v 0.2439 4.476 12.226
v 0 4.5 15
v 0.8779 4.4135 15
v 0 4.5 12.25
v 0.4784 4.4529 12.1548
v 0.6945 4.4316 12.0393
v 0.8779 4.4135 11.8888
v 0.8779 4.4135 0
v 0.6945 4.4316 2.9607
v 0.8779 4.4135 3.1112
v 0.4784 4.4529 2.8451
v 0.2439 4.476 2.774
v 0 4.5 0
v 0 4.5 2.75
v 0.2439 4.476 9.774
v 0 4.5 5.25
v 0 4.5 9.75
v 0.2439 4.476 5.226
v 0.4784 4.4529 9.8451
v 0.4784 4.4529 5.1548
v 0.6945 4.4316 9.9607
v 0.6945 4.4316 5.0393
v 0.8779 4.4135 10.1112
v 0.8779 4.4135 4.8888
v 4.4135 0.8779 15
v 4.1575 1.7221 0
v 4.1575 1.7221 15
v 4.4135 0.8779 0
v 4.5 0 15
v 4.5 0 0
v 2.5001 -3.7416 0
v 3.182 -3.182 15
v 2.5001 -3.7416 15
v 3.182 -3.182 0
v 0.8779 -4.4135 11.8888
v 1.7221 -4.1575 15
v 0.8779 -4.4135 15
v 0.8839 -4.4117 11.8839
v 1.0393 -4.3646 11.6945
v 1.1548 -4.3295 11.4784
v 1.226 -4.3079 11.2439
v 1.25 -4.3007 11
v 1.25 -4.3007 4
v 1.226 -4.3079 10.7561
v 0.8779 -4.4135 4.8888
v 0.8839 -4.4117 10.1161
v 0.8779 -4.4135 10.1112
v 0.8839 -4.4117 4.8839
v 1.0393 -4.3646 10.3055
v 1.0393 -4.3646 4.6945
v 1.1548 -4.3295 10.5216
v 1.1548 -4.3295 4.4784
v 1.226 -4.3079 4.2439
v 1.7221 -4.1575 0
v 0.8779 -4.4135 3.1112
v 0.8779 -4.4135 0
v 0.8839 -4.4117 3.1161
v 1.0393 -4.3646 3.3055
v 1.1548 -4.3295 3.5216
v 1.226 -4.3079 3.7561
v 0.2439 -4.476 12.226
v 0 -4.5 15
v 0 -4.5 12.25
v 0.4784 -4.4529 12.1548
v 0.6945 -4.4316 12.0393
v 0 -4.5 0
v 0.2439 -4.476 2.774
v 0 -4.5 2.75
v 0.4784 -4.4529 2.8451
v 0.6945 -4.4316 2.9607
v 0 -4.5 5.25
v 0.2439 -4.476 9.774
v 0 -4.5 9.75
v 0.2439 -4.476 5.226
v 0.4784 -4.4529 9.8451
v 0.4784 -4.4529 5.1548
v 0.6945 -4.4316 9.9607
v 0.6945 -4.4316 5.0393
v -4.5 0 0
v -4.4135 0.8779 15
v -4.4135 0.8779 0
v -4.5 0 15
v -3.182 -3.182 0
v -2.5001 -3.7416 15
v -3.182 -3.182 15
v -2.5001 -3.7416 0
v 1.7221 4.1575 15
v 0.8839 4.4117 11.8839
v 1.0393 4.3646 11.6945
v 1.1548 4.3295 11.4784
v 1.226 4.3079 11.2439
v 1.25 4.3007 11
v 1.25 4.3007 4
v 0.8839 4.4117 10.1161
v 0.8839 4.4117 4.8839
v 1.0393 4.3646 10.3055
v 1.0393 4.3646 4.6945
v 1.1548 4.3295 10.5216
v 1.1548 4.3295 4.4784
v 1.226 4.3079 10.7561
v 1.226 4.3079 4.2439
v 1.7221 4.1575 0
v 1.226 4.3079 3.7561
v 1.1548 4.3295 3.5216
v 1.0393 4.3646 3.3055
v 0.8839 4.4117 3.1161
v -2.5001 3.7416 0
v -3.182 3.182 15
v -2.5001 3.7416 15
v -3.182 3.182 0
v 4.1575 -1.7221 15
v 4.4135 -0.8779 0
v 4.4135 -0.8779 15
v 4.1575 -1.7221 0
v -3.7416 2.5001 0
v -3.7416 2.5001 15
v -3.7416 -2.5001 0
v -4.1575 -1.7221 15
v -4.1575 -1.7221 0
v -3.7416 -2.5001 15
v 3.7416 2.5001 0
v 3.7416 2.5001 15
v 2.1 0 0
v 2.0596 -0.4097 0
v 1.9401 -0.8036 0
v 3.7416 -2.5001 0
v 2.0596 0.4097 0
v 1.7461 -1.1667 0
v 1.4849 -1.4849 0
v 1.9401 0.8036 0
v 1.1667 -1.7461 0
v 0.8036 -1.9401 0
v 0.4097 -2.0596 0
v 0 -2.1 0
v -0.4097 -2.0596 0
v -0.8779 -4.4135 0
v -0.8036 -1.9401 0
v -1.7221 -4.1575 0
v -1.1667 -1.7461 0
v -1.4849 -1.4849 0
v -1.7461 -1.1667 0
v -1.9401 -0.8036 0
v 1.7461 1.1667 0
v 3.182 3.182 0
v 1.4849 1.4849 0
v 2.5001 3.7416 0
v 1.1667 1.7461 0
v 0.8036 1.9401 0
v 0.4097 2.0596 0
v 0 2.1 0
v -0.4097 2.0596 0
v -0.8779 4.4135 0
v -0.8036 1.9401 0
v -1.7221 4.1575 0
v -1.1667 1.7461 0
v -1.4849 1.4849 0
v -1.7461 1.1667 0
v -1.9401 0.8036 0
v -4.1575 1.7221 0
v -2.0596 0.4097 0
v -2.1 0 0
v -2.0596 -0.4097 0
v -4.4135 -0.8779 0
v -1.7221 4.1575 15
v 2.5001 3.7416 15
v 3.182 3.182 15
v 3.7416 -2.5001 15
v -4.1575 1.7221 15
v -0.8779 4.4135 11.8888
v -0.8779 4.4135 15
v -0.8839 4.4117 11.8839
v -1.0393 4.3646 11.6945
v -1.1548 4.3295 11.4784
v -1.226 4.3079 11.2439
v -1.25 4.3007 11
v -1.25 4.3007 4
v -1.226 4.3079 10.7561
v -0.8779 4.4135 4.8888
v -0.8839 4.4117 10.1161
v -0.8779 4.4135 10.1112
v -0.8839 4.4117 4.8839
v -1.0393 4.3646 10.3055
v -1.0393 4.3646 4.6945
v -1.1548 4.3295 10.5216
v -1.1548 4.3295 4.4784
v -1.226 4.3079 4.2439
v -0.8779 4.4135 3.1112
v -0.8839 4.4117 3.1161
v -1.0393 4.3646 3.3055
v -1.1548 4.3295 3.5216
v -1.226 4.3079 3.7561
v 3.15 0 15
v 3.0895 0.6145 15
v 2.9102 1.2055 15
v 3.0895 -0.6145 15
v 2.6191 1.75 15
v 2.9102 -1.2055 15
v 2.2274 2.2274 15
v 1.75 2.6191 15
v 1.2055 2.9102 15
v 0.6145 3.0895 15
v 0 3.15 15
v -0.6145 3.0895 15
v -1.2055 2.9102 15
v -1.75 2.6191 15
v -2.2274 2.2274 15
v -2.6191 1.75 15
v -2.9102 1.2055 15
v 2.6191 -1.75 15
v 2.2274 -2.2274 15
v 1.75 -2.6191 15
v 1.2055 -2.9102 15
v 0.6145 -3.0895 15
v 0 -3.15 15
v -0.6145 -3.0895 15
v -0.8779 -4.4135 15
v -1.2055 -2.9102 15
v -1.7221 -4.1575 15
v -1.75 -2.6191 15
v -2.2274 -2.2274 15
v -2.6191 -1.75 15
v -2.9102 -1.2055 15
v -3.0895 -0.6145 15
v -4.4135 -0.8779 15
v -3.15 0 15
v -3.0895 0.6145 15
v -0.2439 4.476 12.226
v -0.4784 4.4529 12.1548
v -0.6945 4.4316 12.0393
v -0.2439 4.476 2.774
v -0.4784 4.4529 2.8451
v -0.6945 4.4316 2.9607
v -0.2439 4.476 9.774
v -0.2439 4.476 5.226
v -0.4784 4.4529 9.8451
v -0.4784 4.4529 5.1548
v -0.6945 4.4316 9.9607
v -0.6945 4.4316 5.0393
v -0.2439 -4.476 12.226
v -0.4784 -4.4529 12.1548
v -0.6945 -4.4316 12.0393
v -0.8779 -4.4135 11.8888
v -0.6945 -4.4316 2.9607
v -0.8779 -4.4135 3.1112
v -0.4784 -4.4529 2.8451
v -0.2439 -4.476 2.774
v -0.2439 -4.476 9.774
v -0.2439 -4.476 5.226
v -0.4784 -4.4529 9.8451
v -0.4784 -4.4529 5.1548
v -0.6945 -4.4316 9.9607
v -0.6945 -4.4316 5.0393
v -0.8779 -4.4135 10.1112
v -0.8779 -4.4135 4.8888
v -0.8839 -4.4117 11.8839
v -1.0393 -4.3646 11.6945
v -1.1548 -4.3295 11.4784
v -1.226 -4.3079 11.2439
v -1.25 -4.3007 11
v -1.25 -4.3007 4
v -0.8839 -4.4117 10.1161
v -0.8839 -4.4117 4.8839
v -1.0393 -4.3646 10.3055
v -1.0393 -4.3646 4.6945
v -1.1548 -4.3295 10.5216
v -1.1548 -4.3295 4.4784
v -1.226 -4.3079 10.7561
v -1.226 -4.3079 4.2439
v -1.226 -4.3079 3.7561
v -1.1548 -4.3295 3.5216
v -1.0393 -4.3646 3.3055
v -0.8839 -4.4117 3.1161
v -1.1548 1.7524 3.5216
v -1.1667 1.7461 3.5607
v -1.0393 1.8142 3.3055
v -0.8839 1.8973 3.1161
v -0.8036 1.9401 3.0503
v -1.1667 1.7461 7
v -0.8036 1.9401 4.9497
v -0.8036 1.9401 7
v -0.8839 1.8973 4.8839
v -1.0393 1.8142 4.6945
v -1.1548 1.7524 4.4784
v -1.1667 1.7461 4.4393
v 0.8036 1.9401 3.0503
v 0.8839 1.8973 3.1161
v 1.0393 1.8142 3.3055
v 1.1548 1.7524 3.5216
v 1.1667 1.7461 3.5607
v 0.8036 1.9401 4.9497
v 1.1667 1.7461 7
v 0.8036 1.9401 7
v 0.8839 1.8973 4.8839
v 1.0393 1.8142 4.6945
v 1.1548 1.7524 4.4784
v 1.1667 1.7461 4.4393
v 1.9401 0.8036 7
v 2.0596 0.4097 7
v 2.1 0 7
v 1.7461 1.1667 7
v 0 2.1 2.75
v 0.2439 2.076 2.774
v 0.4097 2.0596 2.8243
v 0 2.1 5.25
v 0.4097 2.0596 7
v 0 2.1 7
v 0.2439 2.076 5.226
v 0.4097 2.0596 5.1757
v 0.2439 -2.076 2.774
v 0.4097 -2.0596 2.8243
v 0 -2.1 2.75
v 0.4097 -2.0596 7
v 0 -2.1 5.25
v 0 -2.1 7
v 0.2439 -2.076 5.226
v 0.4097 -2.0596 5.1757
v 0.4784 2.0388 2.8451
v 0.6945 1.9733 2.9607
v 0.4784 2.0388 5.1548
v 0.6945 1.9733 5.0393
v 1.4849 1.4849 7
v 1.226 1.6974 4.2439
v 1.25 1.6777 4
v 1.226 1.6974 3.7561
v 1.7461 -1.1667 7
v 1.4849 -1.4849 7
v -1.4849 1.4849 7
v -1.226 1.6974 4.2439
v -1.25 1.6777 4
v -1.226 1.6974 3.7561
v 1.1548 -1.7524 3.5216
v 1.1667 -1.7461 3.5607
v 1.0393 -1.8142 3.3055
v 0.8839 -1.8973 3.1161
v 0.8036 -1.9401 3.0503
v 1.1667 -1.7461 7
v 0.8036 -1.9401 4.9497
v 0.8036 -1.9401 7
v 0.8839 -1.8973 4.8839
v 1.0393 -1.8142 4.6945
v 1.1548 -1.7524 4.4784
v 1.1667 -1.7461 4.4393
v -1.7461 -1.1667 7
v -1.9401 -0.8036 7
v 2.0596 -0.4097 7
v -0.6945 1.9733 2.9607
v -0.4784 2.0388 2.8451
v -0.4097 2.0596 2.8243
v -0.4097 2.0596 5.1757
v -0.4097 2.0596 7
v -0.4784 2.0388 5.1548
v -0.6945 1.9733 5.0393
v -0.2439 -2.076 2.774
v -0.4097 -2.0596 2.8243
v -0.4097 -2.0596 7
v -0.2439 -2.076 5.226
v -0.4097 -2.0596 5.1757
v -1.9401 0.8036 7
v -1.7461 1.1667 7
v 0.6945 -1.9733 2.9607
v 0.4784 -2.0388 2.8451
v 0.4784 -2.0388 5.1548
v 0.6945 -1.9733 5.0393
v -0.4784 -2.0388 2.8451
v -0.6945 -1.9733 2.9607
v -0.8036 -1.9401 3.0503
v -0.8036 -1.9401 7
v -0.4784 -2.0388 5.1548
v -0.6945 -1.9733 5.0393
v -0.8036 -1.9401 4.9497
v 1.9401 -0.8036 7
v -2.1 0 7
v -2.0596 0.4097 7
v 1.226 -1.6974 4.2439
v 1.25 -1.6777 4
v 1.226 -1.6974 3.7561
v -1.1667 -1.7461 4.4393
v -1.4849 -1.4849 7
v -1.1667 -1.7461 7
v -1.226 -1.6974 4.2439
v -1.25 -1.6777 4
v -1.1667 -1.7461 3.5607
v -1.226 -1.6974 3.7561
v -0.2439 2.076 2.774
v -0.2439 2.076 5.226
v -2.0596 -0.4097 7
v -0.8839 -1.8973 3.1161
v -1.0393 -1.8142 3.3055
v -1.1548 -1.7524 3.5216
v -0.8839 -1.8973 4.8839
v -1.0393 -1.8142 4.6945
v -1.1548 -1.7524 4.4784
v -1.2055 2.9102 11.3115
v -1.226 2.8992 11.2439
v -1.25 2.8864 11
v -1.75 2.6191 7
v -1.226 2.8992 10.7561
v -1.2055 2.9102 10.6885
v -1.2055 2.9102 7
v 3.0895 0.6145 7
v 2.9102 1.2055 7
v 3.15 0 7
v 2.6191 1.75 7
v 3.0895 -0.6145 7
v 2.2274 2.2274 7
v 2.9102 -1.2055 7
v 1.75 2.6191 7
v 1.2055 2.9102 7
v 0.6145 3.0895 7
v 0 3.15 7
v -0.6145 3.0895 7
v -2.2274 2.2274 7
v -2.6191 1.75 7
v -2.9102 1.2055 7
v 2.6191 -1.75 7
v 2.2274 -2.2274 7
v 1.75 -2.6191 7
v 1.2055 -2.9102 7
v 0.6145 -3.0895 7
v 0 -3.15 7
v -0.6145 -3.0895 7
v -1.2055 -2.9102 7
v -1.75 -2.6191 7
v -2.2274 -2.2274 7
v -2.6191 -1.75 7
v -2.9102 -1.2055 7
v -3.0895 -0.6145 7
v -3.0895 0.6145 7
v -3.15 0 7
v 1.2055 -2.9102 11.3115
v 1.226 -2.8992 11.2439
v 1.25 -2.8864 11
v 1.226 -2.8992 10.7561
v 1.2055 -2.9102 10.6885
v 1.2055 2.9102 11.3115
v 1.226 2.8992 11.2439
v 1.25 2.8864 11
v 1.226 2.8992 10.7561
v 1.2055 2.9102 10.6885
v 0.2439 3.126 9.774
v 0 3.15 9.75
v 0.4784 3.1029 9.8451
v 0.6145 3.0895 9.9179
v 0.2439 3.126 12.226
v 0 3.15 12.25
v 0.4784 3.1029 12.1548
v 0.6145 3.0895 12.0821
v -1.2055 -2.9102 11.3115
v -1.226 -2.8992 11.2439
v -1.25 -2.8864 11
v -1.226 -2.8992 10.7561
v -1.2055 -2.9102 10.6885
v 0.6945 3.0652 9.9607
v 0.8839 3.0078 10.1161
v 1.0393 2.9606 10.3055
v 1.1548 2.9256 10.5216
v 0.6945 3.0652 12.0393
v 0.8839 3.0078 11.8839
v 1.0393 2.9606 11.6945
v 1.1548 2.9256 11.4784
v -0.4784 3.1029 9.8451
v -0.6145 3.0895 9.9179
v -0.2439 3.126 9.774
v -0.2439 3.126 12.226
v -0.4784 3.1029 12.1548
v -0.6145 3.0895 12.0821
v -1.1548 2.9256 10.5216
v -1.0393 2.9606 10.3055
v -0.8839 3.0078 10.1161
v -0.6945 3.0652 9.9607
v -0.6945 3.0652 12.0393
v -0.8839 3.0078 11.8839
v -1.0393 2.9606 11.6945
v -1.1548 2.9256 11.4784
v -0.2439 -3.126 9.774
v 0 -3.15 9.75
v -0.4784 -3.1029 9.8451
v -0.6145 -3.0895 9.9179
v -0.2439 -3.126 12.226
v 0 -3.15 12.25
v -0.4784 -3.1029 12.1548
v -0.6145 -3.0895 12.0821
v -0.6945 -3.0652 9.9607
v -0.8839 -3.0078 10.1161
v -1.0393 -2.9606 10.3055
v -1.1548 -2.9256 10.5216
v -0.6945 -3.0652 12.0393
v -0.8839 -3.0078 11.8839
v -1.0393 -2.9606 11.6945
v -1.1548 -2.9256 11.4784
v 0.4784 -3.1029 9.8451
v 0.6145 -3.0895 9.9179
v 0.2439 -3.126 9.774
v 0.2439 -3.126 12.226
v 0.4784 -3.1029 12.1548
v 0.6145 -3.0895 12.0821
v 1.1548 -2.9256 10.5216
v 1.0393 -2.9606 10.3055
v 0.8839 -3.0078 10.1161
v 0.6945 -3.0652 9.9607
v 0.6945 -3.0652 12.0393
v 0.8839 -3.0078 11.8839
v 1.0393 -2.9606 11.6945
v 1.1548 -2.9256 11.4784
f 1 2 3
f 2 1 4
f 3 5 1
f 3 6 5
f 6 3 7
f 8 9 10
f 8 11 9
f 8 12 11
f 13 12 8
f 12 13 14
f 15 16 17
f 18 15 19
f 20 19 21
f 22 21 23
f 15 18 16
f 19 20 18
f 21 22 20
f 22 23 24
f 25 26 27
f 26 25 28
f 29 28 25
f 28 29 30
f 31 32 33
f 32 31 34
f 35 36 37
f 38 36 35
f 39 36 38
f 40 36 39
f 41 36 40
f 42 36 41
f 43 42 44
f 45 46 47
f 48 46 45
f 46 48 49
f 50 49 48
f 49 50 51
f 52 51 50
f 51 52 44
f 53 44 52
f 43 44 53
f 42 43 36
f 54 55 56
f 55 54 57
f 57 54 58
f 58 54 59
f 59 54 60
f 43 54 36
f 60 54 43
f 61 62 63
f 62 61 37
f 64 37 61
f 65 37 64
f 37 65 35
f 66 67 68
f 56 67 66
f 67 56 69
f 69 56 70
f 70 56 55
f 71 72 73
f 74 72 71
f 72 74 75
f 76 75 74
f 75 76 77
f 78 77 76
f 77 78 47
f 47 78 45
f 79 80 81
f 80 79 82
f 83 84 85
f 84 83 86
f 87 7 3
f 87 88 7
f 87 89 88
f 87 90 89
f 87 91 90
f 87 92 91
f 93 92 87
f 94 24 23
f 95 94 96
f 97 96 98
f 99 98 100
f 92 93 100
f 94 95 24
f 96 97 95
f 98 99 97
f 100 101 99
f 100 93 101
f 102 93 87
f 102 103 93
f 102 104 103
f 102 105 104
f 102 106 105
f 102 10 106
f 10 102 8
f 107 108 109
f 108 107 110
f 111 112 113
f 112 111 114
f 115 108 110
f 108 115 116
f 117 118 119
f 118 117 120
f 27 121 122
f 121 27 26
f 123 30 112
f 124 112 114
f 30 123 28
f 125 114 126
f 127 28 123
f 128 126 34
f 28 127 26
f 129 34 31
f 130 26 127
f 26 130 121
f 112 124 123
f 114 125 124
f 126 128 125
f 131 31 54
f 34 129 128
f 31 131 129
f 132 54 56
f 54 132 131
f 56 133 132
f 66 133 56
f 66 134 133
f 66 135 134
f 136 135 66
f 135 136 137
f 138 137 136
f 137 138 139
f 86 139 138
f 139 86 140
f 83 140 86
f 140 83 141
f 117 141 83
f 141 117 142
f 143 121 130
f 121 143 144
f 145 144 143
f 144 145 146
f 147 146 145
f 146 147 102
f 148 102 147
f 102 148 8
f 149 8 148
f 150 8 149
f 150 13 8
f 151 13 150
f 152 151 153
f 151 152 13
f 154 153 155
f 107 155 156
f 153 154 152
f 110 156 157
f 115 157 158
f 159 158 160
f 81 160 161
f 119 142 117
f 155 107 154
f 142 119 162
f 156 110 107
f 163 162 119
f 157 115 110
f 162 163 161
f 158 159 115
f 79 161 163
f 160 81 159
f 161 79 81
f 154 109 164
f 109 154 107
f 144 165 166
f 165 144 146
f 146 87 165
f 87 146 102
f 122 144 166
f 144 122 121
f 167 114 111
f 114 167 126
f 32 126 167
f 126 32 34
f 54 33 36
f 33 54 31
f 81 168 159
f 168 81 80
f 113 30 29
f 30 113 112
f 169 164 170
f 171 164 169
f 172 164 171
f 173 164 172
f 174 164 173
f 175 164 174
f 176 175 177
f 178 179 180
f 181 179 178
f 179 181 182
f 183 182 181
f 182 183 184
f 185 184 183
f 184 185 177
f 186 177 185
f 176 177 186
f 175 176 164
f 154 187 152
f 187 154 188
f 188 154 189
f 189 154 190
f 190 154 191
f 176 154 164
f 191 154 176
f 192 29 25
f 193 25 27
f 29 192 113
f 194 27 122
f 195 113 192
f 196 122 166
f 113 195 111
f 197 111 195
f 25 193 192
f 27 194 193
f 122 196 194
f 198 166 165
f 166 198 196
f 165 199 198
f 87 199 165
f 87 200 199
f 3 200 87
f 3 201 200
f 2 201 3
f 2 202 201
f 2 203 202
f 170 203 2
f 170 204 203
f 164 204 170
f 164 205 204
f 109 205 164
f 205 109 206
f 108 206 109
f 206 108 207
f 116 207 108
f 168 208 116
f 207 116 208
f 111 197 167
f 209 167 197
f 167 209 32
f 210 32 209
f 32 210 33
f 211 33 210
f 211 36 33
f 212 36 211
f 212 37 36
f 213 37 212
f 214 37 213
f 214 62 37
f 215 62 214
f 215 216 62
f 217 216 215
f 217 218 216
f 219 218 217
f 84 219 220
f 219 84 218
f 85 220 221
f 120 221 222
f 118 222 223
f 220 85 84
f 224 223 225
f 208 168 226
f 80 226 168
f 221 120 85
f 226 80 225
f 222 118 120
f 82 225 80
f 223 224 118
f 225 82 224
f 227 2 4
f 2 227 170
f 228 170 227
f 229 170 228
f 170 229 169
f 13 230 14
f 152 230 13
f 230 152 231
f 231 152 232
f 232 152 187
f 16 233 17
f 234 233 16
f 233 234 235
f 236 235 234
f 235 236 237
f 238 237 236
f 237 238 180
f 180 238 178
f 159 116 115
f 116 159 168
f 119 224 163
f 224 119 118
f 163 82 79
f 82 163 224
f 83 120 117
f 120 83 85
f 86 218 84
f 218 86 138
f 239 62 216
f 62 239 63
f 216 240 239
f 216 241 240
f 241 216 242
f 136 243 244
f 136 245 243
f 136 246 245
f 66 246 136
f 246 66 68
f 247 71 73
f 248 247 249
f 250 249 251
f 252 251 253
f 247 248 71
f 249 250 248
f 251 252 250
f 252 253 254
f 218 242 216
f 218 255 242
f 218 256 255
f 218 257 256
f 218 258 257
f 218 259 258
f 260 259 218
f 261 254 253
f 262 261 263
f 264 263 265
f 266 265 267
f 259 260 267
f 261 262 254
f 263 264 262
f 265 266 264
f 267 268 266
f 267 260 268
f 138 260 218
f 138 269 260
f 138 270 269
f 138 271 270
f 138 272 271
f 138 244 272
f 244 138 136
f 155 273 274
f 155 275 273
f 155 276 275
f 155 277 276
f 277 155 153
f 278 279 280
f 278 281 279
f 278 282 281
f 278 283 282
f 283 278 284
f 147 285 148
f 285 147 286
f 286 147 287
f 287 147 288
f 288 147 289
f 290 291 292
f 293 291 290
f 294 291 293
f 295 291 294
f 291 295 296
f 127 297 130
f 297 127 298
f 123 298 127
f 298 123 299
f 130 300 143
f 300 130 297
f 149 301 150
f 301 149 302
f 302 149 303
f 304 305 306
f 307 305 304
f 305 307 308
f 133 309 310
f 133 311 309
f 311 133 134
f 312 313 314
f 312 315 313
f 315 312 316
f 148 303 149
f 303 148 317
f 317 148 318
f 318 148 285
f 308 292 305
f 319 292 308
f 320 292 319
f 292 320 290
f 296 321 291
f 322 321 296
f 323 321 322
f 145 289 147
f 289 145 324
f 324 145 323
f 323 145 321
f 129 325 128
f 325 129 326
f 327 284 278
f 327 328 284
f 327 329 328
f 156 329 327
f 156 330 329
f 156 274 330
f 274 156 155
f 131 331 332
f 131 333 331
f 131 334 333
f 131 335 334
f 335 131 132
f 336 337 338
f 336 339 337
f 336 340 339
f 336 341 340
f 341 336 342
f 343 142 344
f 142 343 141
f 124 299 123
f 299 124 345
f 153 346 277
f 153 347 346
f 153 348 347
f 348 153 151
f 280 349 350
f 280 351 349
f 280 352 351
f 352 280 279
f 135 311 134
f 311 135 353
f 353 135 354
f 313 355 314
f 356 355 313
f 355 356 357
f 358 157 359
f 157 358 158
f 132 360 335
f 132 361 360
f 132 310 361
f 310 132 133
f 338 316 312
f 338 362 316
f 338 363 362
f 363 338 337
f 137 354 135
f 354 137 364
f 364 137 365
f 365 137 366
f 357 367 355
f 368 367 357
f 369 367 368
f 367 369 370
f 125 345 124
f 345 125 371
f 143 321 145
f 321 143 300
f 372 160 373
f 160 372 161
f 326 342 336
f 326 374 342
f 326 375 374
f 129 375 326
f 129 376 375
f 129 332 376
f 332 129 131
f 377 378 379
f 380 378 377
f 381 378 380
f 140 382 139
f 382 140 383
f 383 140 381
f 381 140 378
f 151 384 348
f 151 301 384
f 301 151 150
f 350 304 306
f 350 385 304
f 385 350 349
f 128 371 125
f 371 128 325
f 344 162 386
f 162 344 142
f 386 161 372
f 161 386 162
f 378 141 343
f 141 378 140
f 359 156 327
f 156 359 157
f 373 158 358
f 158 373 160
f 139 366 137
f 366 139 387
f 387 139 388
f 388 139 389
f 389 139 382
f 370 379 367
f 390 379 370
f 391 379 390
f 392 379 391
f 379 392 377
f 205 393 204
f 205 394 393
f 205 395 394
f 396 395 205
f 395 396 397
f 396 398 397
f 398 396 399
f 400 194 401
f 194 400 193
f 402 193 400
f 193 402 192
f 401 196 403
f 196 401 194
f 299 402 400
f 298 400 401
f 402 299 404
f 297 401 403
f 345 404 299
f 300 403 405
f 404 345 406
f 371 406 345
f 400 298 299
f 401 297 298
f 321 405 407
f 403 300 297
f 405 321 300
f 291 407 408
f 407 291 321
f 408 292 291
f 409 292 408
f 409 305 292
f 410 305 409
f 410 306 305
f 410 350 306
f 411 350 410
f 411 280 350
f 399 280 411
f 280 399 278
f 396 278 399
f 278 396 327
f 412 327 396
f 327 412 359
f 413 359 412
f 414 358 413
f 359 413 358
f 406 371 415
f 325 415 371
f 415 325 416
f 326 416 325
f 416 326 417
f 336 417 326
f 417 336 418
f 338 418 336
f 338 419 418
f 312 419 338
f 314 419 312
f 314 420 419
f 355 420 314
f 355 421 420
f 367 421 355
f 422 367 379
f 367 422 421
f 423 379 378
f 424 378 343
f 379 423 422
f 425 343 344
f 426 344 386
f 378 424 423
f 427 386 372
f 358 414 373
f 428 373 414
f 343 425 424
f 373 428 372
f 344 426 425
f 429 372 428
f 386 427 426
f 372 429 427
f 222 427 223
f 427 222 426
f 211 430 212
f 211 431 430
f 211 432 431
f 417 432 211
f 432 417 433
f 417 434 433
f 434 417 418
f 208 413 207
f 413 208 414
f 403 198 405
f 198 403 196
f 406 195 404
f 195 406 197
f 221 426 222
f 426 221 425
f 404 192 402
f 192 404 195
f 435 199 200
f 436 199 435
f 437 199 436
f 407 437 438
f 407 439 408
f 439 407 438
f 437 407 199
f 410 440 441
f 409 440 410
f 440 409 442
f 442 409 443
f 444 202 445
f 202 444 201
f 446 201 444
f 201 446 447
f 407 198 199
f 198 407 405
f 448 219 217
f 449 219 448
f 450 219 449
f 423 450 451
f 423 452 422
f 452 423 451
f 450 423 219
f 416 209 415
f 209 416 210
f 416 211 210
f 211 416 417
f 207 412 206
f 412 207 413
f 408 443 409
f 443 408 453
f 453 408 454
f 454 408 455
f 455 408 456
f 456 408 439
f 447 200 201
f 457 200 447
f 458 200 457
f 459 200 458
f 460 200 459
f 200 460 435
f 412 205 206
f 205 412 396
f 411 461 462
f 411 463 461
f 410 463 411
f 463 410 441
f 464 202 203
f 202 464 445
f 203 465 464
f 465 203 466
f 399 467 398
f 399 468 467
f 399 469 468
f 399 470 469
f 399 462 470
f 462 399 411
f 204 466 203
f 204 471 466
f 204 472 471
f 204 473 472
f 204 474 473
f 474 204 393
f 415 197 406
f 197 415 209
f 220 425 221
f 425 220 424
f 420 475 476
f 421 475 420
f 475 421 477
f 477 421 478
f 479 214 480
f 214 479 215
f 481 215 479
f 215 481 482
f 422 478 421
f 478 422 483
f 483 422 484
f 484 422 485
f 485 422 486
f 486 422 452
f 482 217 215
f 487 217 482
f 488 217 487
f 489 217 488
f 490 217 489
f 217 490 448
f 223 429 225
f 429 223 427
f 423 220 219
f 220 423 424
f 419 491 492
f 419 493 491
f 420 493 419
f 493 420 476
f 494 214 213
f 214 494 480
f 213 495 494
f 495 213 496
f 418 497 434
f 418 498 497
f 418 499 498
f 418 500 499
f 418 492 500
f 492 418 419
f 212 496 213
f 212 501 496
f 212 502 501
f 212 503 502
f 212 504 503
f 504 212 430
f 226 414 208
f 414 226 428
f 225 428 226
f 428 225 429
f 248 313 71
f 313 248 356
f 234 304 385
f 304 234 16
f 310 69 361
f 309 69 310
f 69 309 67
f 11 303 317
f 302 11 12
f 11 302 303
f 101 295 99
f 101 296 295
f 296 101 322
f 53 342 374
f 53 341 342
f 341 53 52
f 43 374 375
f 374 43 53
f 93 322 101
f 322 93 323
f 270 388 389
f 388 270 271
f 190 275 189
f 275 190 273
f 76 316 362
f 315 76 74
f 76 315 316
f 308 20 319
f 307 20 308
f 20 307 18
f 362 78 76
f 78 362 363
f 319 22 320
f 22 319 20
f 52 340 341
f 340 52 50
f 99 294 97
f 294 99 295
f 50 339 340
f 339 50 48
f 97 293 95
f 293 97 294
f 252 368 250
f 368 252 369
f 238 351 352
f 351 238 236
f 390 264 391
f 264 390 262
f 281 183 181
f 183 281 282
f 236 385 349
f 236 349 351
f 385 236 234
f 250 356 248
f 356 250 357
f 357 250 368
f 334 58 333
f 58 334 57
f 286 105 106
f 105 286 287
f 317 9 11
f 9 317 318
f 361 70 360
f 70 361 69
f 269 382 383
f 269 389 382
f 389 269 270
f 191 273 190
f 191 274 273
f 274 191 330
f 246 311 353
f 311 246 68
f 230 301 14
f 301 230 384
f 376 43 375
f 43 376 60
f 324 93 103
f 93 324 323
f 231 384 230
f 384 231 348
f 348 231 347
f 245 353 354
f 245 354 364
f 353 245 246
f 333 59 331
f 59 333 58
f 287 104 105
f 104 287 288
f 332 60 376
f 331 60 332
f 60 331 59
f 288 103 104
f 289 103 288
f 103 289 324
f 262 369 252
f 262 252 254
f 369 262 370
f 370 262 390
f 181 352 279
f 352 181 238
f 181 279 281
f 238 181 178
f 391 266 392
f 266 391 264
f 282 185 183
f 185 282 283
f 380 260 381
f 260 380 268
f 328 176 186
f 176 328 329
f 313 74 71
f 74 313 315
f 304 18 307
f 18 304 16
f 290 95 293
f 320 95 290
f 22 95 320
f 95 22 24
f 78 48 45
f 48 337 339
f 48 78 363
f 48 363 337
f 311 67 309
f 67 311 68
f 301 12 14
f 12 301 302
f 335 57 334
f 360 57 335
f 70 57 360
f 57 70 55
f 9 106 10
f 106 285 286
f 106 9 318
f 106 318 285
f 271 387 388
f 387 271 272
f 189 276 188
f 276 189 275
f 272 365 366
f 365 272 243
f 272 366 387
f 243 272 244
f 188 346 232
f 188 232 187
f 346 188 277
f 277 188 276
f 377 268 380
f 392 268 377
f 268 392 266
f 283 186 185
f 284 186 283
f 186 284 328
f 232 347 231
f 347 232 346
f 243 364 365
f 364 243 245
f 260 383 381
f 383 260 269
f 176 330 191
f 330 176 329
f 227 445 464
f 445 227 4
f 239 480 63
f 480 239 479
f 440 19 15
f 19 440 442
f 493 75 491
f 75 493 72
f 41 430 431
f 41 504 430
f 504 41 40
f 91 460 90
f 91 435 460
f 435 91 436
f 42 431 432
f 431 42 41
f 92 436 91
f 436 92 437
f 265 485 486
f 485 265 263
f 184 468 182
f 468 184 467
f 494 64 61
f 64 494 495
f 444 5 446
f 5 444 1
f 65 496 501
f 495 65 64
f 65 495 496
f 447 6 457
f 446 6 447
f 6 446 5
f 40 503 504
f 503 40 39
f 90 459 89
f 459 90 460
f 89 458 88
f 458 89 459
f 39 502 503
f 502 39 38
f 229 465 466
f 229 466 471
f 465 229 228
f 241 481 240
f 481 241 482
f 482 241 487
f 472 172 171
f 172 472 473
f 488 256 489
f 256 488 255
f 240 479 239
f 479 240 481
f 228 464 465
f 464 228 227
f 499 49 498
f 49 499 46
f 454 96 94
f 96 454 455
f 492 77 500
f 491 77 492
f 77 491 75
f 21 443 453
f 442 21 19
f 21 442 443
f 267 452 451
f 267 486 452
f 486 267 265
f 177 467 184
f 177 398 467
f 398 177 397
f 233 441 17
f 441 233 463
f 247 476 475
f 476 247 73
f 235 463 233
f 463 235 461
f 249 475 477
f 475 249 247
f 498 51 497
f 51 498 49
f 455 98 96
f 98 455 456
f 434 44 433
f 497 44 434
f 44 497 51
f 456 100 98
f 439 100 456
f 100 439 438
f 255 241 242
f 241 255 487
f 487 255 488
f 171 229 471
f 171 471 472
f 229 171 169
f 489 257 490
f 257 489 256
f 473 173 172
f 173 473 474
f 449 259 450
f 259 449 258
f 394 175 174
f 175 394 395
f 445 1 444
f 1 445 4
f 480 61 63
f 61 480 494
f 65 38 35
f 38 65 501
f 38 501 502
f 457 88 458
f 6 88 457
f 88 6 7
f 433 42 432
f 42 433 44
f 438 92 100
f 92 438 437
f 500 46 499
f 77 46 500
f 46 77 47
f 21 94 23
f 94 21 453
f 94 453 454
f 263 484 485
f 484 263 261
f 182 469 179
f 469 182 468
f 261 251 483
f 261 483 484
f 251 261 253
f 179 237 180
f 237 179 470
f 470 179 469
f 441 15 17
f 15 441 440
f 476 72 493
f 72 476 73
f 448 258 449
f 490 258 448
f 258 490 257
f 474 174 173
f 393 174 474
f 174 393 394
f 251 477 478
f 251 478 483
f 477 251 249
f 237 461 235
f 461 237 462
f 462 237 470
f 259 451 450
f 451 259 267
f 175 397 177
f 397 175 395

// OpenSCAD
$fn=32;

height=15;

difference() {
    translate([0, 0, height / 2])
        cylinder(d=9, h=height, center=true);
    
    translate([0, 0, height/4])
        cylinder(d=4.2, h=1 + height/2, center=true);


    translate([0, 0, 3 * height/4])
        intersection() {
            cylinder(d=6.3, h=1 + height/2, center=true);
            
//            translate([0, .75, 0]) cube([6.3, 4.8, 1 + height/2], center=true);
        }
        
    translate([0, 0, 4])
        rotate([90])
            cylinder(d=2.5, h=10, center=true);

    translate([0, 0, 11])
        rotate([90])
            cylinder(d=2.5, h=10, center=true);
}
